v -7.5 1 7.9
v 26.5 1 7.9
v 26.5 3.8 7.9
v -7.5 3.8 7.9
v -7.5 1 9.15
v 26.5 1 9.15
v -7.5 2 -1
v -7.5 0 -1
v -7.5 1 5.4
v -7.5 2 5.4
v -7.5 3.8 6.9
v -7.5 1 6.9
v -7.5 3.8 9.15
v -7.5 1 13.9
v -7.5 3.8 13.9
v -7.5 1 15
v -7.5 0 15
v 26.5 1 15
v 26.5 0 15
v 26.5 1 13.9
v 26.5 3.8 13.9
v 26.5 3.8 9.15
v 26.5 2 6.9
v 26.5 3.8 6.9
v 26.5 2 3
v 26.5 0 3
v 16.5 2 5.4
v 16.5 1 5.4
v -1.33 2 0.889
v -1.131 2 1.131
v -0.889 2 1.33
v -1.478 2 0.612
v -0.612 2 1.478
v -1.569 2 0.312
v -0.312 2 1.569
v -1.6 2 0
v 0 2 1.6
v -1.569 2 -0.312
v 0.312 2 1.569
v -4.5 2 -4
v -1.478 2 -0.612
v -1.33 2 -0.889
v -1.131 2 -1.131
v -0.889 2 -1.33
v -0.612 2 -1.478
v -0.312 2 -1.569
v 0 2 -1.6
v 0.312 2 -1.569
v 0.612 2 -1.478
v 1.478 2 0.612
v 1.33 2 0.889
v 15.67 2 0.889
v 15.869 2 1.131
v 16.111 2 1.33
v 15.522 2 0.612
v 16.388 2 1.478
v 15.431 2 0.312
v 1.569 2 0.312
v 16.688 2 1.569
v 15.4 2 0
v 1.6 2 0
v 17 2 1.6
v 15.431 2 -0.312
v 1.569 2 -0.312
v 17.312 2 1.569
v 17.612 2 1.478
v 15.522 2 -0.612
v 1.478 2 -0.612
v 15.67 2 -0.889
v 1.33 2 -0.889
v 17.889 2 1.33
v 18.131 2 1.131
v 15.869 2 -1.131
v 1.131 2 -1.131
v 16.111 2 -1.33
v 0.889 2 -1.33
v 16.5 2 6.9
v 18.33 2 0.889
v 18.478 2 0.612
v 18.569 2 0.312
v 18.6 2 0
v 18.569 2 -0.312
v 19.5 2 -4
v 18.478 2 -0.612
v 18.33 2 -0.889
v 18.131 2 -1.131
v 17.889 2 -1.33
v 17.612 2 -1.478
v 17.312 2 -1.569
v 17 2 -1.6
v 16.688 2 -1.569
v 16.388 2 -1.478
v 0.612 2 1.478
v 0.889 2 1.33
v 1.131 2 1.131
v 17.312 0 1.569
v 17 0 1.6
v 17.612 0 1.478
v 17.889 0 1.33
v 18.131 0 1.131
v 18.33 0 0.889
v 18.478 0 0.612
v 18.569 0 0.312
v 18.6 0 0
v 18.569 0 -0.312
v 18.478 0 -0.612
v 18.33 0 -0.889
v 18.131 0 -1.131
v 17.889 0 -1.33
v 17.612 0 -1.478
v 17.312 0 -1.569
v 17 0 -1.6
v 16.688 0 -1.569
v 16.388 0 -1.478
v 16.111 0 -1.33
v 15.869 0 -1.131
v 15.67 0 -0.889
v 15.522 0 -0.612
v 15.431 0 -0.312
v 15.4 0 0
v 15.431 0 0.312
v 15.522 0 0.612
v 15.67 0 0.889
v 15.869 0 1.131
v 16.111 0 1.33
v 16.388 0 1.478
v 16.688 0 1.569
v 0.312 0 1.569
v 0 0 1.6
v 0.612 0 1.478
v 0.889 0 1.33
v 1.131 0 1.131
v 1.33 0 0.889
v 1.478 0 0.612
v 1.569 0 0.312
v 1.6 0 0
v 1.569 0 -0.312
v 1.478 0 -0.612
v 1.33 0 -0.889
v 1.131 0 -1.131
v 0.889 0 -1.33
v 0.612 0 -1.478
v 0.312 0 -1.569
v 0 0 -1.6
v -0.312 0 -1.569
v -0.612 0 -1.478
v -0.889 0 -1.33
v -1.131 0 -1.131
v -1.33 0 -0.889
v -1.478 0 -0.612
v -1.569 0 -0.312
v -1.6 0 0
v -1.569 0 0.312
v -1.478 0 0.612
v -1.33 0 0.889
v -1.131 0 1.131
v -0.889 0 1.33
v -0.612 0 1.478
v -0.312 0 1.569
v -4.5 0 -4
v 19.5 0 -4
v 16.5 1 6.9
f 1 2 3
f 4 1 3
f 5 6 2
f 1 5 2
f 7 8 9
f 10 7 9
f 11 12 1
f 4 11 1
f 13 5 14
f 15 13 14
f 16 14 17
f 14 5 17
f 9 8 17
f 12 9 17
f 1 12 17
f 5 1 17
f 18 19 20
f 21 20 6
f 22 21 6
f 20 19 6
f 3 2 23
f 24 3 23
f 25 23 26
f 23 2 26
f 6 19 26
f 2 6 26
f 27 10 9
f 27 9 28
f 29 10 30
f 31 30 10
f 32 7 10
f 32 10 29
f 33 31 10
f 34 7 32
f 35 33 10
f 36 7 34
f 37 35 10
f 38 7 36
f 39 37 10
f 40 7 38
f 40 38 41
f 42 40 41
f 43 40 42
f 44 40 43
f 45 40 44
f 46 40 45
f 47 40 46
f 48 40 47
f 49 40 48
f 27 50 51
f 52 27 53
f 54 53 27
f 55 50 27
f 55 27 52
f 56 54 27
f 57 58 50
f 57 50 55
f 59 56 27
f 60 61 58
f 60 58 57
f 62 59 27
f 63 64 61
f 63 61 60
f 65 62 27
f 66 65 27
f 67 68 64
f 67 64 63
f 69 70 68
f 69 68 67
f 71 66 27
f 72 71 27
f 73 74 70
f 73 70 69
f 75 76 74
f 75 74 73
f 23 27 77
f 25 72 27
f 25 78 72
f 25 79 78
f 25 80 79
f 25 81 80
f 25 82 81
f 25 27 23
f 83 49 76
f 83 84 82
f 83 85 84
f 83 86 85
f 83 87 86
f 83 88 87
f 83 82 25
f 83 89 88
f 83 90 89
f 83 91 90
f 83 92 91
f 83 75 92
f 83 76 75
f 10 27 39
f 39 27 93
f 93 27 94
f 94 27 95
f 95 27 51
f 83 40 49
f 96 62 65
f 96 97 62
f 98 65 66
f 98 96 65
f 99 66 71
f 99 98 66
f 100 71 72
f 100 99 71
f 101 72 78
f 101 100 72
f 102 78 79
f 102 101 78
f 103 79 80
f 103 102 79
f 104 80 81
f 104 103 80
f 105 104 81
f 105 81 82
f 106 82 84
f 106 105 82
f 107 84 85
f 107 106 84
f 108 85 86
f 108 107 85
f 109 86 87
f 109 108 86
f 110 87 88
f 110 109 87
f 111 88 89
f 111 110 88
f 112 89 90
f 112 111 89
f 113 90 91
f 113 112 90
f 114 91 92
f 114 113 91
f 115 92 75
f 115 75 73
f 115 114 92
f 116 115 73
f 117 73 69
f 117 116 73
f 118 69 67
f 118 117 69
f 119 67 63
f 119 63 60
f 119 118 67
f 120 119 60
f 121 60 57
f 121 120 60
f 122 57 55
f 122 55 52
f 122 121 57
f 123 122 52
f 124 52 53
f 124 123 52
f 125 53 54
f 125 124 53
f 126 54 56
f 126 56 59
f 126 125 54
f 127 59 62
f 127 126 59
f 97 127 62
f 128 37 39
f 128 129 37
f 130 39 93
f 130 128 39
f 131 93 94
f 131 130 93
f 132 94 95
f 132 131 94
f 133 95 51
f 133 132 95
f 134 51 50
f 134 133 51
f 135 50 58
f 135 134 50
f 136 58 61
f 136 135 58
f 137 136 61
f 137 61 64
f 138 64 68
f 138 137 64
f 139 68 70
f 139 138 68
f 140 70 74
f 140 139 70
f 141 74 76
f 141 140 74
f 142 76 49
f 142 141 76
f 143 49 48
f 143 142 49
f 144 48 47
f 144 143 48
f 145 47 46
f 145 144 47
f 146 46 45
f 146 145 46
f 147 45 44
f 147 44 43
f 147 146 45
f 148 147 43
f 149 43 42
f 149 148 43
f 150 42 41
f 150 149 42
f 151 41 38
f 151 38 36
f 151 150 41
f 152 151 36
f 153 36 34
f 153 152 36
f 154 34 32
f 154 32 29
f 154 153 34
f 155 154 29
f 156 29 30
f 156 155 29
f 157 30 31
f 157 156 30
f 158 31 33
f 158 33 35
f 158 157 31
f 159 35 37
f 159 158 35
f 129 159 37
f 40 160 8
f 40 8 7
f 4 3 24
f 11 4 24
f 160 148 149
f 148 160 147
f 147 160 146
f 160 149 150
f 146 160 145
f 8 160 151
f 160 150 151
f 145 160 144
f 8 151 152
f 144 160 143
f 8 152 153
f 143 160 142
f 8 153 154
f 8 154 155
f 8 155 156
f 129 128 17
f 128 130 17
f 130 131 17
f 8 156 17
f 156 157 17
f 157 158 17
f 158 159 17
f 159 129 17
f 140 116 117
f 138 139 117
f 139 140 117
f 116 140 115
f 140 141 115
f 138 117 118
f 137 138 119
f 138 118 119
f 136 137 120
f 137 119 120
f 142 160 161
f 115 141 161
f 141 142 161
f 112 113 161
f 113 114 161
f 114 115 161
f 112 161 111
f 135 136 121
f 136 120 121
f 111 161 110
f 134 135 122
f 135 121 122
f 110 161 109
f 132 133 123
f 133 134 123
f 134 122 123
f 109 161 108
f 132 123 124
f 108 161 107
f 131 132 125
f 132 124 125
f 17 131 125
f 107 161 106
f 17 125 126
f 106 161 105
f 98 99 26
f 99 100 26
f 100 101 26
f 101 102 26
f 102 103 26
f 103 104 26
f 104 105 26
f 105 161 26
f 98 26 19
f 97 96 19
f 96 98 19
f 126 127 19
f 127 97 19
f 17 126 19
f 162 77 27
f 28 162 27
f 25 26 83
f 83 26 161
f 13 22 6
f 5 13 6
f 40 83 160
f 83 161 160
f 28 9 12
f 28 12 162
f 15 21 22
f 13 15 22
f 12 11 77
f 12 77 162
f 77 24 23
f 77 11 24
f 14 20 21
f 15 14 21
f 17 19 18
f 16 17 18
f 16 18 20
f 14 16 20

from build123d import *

# Parameters (mm, degrees)
SKETCH_1_W          = 32
SKETCH_1_H          = 19
SKETCH_1_R          = 1.6
EXTRUDE_1_DEPTH     = 1
SKETCH_3_W          = 32
SKETCH_3_H          = 4.75
EXTRUDE_2_DEPTH     = 2.8
SKETCH_4_W          = 32
SKETCH_4_H          = 1
EXTRUDE_3_DEPTH     = 2.8
EXTRUDE_4_DEPTH     = 2
EXTRUDE_5_DEPTH     = 7
CHAMFER_1_SIZE      = 7
SKETCH_7_R          = 1.6
EXTRUDE_6_DEPTH     = 1
SKETCH_8_W          = 4
SKETCH_8_H          = 16
CUT_EXTRUDE_1_DEPTH = 31.686967918
SKETCH_9_W          = 27
SKETCH_9_H          = 1.5
CUT_EXTRUDE_2_DEPTH = 1
SKETCH_10_W         = 3
SKETCH_10_H         = 19
CUT_EXTRUDE_3_DEPTH = 31.686967918
CHAMFER_2_SIZE      = 3


with BuildPart() as part:
    # 草图1 → 凸台-拉伸1 (new body)
    with BuildSketch(Plane(origin=(0, 0, 0), x_dir=(1, 0, 0), z_dir=(0, 1, 0))):
        with Locations((8.5, -5.5)):
            Rectangle(SKETCH_1_W, SKETCH_1_H)
        with Locations(Location((0, 0, 0), (0, 0, 270))):
            Circle(SKETCH_1_R, mode=Mode.SUBTRACT)
        with Locations(Location((17, 0, 0), (0, 0, 270))):
            Circle(SKETCH_1_R, mode=Mode.SUBTRACT)
    extrude(amount=EXTRUDE_1_DEPTH)

    # 草图3 → 凸台-拉伸2 (add)
    with BuildSketch(Plane(origin=(0, 1, 0), x_dir=(1, 0, 0), z_dir=(0, 1, 0))):
        with Locations((8.5, -11.525)):
            Rectangle(SKETCH_3_W, SKETCH_3_H)
    extrude(amount=EXTRUDE_2_DEPTH)

    # 草图4 → 凸台-拉伸3 (add)
    with BuildSketch(Plane(origin=(0, 1, 0), x_dir=(1, 0, 0), z_dir=(0, 1, 0))):
        with Locations((8.5, -7.4)):
            Rectangle(SKETCH_4_W, SKETCH_4_H)
    extrude(amount=EXTRUDE_3_DEPTH)

    # 草图5 → 凸台-拉伸4 (add)
    with BuildSketch(Plane(origin=(24.5, 0, 0), x_dir=(0, 0, -1), z_dir=(1, 0, 0))):
        Polygon((-15, 0), (4, 0), (4, 1), (-6.9, 1), (-6.9, 3.8), (-7.9, 3.8), (-7.9, 1), (-9.15, 1), (-9.15, 3.8), (-13.9, 3.8), (-13.9, 1), (-15, 1), align=None)
    extrude(amount=EXTRUDE_4_DEPTH)

    # 草图6 → 凸台-拉伸5 (add)
    with BuildSketch(Plane.ZY.offset(7.5)):
        Polygon((-4, 0), (15, 0), (15, 1), (13.9, 1), (13.9, 3.8), (9.15, 3.8), (9.15, 1), (7.9, 1), (7.9, 3.8), (6.9, 3.8), (6.9, 1), (-4, 1), align=None)
    extrude(amount=EXTRUDE_5_DEPTH)

    # 倒角1
    chamfer_1_edges = [part.edges().sort_by_distance(p)[0] for p in [
        (26.5, 0.5, -4),
        (-14.5, 0.5, -4),
    ]]
    chamfer(chamfer_1_edges, length=CHAMFER_1_SIZE)

    # 草图7 → 凸台-拉伸6 (add)
    with BuildSketch(Plane(origin=(0, 1, 0), x_dir=(1, 0, 0), z_dir=(0, 1, 0))):
        Polygon((26.5, -6.9), (26.5, -3), (19.5, 4), (-7.5, 4), (-14.5, -3), (-14.5, -6.9), align=None)
        with Locations(Location((17, 0, 0), (0, 0, 270))):
            Circle(SKETCH_7_R, mode=Mode.SUBTRACT)
        with Locations(Location((0, 0, 0), (0, 0, 270))):
            Circle(SKETCH_7_R, mode=Mode.SUBTRACT)
    extrude(amount=EXTRUDE_6_DEPTH)

    # 草图8 → 切除-拉伸1 (cut, through all)
    with BuildSketch(Plane(origin=(0, 3.8, 0), x_dir=(1, 0, 0), z_dir=(0, 1, 0))):
        with Locations((-12.5, -7)):
            Rectangle(SKETCH_8_W, SKETCH_8_H)
    extrude(amount=-CUT_EXTRUDE_1_DEPTH, mode=Mode.SUBTRACT)

    # 草图9 → 切除-拉伸2 (cut)
    with BuildSketch(Plane(origin=(0, 2, 0), x_dir=(1, 0, 0), z_dir=(0, 1, 0))):
        with Locations((3, -6.15)):
            Rectangle(SKETCH_9_W, SKETCH_9_H)
    extrude(amount=-CUT_EXTRUDE_2_DEPTH, mode=Mode.SUBTRACT)

    # 草图10 → 切除-拉伸3 (cut, through all)
    with BuildSketch(Plane.XZ):
        with Locations((-9, 5.5)):
            Rectangle(SKETCH_10_W, SKETCH_10_H)
    extrude(amount=-CUT_EXTRUDE_3_DEPTH, mode=Mode.SUBTRACT)

    # 倒角2
    chamfer_2_edges = [part.edges().sort_by_distance(p)[0] for p in [
        (-7.5, 1, -4),
    ]]
    chamfer(chamfer_2_edges, length=CHAMFER_2_SIZE)


solid = part.part
